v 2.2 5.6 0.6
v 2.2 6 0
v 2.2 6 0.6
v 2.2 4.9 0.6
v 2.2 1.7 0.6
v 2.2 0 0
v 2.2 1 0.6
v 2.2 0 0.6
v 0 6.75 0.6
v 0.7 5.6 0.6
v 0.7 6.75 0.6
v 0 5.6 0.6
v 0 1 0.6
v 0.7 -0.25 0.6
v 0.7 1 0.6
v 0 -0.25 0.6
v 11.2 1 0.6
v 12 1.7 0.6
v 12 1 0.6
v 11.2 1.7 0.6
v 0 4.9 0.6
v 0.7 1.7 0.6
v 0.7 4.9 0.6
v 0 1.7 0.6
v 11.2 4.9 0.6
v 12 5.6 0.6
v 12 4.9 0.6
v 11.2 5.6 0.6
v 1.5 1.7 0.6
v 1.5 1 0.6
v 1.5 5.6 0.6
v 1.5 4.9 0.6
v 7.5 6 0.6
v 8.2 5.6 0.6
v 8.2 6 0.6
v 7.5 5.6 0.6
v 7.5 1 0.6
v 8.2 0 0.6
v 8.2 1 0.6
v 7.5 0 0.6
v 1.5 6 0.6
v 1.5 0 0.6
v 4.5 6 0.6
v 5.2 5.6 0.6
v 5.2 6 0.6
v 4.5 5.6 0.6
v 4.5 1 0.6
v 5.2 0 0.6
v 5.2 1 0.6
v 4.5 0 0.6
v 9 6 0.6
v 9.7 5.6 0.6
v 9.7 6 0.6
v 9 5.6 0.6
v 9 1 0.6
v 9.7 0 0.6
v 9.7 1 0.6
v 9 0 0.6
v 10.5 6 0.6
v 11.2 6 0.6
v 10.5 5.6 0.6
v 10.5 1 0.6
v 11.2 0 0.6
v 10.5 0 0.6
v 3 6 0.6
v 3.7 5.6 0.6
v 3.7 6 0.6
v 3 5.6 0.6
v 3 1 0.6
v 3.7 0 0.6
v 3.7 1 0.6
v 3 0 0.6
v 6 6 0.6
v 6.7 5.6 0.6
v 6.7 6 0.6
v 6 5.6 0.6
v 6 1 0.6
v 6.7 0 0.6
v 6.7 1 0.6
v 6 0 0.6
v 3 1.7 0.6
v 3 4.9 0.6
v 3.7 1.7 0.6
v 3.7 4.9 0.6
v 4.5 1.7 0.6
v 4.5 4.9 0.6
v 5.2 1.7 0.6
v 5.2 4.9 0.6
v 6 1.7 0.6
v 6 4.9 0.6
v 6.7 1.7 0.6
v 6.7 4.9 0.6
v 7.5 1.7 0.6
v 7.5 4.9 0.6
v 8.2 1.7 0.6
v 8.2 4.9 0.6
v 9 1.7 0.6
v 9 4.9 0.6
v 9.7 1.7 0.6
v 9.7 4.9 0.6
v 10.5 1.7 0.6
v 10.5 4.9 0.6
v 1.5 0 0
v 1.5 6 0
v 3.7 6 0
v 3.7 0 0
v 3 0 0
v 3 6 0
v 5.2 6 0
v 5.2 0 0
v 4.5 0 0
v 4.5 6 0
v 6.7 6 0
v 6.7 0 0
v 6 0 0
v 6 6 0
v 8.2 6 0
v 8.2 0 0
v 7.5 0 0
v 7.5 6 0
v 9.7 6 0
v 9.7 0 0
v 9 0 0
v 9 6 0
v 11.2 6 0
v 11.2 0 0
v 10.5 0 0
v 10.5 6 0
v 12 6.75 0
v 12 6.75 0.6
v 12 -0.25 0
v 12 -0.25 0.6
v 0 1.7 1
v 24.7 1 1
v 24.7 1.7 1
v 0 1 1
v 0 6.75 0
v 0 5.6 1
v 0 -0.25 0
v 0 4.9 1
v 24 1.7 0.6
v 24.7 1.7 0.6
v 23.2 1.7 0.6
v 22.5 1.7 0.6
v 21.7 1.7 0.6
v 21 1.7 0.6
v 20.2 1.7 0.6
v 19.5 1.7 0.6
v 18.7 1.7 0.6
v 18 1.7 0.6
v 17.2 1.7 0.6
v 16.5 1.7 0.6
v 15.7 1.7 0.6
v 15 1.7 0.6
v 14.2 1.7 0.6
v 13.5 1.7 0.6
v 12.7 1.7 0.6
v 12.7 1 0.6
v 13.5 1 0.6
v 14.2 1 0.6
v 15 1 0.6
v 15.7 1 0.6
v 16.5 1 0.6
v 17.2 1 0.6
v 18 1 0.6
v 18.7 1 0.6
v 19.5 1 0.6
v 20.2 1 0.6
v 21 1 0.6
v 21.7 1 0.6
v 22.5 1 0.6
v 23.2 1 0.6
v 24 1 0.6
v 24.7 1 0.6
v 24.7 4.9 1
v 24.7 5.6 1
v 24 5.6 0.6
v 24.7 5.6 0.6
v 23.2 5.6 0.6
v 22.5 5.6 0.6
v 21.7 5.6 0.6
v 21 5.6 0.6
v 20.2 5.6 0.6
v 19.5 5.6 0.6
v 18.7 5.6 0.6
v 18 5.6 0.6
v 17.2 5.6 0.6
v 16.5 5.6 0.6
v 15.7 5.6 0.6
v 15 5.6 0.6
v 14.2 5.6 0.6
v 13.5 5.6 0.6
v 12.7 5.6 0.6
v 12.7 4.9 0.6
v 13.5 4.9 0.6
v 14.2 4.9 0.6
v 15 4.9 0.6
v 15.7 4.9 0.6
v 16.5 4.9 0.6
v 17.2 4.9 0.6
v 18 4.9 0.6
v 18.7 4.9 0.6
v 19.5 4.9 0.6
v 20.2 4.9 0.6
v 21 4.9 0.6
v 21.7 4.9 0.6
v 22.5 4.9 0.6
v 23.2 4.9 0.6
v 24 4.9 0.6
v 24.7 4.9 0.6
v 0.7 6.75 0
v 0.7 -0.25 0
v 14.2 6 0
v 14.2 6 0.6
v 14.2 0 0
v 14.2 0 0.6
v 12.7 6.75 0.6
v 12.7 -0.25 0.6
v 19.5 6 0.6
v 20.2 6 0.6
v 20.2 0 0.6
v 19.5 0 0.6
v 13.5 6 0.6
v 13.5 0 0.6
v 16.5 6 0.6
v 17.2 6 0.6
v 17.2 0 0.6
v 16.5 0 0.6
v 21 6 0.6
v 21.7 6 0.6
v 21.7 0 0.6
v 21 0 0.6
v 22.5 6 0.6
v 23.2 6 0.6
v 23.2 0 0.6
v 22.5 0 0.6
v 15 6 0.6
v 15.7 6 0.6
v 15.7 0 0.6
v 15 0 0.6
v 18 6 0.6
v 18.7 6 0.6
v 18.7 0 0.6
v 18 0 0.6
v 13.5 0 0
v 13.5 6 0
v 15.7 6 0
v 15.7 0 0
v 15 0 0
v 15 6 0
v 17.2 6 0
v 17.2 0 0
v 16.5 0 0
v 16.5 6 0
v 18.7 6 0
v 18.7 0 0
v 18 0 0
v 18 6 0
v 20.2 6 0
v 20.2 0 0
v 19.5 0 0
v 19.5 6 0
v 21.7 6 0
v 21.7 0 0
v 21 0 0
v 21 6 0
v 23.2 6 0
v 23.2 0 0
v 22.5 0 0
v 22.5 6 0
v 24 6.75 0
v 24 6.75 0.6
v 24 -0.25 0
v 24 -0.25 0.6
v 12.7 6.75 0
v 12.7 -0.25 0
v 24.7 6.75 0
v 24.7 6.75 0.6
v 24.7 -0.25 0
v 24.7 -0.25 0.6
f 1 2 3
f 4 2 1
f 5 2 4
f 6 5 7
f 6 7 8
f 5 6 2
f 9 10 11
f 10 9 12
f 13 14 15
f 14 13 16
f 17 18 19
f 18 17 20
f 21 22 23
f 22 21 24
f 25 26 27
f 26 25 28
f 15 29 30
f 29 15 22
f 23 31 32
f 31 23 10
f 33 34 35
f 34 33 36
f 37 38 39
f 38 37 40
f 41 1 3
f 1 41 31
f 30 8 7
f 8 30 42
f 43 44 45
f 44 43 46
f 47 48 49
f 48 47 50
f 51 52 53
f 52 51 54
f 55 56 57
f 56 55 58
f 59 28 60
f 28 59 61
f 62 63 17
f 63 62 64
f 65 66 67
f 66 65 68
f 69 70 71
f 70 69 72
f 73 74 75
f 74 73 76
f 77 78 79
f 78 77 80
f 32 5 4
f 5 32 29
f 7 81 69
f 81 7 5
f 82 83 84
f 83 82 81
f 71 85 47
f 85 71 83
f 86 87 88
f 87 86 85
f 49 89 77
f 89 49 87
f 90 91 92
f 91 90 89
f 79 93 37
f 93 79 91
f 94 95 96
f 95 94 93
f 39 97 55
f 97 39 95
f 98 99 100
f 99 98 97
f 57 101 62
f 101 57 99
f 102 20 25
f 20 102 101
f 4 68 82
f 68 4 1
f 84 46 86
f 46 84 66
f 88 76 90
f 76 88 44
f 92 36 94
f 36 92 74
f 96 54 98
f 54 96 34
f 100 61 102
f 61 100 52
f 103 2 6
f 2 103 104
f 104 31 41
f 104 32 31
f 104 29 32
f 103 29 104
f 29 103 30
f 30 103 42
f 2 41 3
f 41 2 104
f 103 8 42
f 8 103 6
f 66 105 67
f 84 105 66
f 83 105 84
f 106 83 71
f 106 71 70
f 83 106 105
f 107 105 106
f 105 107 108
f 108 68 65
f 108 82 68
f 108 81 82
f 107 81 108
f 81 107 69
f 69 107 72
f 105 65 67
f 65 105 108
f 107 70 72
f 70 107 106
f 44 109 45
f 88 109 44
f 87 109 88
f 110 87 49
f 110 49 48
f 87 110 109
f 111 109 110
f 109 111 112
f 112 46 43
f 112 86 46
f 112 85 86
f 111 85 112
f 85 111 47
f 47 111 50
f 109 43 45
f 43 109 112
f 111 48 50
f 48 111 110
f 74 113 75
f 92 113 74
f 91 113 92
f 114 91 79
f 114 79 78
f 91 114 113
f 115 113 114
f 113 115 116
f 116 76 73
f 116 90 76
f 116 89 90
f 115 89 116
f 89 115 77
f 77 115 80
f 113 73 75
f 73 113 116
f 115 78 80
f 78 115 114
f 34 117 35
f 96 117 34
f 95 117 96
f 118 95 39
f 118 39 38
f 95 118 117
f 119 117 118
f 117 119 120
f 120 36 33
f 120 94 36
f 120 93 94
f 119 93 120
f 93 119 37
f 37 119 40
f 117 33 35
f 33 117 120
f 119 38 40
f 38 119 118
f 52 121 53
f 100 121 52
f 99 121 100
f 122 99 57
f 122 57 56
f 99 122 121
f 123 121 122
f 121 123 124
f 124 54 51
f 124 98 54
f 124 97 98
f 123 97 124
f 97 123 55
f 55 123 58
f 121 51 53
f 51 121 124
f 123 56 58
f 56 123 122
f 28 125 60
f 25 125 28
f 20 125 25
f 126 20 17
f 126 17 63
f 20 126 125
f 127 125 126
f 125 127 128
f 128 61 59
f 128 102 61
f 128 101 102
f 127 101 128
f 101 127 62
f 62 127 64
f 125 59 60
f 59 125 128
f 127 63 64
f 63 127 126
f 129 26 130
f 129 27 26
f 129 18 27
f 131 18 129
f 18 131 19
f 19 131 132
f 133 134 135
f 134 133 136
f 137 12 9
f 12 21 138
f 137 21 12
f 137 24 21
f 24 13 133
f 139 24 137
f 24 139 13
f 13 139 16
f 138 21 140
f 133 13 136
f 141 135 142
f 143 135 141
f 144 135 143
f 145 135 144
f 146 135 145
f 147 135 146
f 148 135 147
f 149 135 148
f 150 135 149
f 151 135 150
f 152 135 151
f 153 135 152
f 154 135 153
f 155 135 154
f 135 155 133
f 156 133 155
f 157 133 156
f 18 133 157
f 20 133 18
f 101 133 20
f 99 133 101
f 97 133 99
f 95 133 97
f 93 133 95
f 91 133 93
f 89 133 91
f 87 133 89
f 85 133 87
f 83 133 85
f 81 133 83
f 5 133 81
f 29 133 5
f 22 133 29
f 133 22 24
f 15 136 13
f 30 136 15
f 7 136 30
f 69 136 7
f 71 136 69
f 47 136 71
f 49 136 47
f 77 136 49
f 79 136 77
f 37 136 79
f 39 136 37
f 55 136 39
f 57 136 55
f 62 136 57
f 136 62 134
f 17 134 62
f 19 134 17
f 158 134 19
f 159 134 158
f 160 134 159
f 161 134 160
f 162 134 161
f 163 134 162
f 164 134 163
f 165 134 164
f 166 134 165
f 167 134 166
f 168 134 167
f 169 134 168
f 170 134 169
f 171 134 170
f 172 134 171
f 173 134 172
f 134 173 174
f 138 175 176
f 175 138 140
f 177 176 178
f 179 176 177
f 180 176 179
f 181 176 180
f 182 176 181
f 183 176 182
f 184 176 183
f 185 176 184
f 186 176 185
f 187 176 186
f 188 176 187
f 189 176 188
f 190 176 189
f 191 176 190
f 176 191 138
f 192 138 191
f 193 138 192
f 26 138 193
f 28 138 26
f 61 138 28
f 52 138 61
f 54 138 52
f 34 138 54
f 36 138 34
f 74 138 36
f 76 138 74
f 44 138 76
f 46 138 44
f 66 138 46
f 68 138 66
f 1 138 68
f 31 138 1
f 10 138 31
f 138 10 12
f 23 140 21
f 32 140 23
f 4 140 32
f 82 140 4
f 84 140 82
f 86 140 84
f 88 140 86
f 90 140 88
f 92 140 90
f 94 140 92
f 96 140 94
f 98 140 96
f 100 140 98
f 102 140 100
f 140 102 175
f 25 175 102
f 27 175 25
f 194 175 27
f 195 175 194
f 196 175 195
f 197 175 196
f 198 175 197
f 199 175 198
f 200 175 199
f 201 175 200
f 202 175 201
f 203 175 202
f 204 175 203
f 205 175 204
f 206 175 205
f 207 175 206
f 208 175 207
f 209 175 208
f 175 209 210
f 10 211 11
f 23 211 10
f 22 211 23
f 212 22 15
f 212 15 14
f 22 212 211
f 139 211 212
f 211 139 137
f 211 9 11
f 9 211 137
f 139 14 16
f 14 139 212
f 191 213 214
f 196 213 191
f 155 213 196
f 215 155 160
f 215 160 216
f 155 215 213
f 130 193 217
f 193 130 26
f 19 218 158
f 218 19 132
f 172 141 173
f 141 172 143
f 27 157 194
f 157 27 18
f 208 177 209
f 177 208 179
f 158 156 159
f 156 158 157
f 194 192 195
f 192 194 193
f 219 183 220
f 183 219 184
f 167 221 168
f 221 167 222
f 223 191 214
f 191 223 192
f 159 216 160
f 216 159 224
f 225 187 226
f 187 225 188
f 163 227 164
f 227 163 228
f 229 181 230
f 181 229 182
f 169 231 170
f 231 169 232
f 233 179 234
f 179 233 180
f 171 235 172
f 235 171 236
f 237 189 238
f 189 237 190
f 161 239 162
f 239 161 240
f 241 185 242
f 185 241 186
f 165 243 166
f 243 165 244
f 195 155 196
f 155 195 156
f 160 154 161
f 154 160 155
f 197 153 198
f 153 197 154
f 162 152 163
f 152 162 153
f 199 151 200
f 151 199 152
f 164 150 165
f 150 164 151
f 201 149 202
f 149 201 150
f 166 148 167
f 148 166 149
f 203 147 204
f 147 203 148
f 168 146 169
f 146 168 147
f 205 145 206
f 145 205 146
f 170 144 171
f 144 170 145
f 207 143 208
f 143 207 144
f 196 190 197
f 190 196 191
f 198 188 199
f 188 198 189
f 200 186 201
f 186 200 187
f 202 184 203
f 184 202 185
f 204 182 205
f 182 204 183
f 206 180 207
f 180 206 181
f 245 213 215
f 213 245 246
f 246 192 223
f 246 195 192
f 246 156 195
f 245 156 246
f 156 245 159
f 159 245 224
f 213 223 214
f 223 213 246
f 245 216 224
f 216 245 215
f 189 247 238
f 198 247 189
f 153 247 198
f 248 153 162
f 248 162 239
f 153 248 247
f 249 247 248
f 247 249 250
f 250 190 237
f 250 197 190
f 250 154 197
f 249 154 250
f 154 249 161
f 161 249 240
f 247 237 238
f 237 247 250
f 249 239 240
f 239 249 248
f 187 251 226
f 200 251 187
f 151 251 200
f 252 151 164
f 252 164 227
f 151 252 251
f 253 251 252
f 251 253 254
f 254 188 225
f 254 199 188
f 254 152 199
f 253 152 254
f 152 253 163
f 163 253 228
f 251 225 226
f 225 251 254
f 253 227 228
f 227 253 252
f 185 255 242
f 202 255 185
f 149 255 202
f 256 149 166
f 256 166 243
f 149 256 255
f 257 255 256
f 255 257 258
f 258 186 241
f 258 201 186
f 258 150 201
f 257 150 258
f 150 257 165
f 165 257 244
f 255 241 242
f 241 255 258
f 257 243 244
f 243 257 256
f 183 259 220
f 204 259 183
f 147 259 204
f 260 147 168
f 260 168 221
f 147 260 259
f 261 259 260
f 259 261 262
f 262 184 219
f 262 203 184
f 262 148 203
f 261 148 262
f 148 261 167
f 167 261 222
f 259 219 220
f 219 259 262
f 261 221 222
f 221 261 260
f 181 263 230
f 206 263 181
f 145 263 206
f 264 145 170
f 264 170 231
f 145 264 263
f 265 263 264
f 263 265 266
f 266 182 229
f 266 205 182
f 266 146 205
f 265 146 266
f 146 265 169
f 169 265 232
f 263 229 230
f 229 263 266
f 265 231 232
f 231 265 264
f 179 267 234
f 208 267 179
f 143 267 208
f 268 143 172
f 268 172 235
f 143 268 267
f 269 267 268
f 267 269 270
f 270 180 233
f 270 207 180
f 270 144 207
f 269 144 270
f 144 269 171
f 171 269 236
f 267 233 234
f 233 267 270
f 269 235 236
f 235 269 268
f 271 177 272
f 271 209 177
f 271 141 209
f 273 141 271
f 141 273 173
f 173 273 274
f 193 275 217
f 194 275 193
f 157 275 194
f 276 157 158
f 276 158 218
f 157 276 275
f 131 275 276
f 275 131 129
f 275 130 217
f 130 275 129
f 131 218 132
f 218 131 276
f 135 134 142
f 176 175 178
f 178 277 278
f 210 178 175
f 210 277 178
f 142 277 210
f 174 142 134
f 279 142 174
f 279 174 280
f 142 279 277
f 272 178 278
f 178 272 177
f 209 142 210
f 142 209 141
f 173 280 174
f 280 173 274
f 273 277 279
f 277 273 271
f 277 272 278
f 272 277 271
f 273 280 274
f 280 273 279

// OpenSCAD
//
//	Customizable Fence for N Scale Model Railroads
//	Steve Medwin
//	April 12, 2014
// 

// preview[view:north, tilt:bottom]

Nslats=8*1;
width=0.7*1;
height=6*1;
depth=0.6*1;
spacing=1.5*1;
bar_depth=depth-0.2;
// How many fence sections?
number_sections=2; // [1:20]



module fence() {
// vertical slats
	for (i=[1:Nslats-1]){
		translate([i*spacing,0,0]) cube([width,height,depth]);
		}

// horizontal bars
	translate([0,1,depth]) cube([Nslats*spacing,width,bar_depth]);
	translate([0,height-1.1,depth]) cube([Nslats*spacing,width,bar_depth]);

// vertical post
	translate([0,,-0.250]) cube([width,height+1,depth]);
}

// make fence
for (j=[0:number_sections-1]) {
	translate ([j*Nslats*spacing,0,0]) fence();
}

// end the row of fences
// vertical post
	translate([number_sections*Nslats*spacing,-0.25,0]) cube([width,height+1,depth]);

// horizontal bars
	translate([number_sections*Nslats*spacing,1,depth]) cube([width,width,bar_depth]);
	translate([number_sections*Nslats*spacing,height-1.1,depth]) cube([width,width,bar_depth]);
